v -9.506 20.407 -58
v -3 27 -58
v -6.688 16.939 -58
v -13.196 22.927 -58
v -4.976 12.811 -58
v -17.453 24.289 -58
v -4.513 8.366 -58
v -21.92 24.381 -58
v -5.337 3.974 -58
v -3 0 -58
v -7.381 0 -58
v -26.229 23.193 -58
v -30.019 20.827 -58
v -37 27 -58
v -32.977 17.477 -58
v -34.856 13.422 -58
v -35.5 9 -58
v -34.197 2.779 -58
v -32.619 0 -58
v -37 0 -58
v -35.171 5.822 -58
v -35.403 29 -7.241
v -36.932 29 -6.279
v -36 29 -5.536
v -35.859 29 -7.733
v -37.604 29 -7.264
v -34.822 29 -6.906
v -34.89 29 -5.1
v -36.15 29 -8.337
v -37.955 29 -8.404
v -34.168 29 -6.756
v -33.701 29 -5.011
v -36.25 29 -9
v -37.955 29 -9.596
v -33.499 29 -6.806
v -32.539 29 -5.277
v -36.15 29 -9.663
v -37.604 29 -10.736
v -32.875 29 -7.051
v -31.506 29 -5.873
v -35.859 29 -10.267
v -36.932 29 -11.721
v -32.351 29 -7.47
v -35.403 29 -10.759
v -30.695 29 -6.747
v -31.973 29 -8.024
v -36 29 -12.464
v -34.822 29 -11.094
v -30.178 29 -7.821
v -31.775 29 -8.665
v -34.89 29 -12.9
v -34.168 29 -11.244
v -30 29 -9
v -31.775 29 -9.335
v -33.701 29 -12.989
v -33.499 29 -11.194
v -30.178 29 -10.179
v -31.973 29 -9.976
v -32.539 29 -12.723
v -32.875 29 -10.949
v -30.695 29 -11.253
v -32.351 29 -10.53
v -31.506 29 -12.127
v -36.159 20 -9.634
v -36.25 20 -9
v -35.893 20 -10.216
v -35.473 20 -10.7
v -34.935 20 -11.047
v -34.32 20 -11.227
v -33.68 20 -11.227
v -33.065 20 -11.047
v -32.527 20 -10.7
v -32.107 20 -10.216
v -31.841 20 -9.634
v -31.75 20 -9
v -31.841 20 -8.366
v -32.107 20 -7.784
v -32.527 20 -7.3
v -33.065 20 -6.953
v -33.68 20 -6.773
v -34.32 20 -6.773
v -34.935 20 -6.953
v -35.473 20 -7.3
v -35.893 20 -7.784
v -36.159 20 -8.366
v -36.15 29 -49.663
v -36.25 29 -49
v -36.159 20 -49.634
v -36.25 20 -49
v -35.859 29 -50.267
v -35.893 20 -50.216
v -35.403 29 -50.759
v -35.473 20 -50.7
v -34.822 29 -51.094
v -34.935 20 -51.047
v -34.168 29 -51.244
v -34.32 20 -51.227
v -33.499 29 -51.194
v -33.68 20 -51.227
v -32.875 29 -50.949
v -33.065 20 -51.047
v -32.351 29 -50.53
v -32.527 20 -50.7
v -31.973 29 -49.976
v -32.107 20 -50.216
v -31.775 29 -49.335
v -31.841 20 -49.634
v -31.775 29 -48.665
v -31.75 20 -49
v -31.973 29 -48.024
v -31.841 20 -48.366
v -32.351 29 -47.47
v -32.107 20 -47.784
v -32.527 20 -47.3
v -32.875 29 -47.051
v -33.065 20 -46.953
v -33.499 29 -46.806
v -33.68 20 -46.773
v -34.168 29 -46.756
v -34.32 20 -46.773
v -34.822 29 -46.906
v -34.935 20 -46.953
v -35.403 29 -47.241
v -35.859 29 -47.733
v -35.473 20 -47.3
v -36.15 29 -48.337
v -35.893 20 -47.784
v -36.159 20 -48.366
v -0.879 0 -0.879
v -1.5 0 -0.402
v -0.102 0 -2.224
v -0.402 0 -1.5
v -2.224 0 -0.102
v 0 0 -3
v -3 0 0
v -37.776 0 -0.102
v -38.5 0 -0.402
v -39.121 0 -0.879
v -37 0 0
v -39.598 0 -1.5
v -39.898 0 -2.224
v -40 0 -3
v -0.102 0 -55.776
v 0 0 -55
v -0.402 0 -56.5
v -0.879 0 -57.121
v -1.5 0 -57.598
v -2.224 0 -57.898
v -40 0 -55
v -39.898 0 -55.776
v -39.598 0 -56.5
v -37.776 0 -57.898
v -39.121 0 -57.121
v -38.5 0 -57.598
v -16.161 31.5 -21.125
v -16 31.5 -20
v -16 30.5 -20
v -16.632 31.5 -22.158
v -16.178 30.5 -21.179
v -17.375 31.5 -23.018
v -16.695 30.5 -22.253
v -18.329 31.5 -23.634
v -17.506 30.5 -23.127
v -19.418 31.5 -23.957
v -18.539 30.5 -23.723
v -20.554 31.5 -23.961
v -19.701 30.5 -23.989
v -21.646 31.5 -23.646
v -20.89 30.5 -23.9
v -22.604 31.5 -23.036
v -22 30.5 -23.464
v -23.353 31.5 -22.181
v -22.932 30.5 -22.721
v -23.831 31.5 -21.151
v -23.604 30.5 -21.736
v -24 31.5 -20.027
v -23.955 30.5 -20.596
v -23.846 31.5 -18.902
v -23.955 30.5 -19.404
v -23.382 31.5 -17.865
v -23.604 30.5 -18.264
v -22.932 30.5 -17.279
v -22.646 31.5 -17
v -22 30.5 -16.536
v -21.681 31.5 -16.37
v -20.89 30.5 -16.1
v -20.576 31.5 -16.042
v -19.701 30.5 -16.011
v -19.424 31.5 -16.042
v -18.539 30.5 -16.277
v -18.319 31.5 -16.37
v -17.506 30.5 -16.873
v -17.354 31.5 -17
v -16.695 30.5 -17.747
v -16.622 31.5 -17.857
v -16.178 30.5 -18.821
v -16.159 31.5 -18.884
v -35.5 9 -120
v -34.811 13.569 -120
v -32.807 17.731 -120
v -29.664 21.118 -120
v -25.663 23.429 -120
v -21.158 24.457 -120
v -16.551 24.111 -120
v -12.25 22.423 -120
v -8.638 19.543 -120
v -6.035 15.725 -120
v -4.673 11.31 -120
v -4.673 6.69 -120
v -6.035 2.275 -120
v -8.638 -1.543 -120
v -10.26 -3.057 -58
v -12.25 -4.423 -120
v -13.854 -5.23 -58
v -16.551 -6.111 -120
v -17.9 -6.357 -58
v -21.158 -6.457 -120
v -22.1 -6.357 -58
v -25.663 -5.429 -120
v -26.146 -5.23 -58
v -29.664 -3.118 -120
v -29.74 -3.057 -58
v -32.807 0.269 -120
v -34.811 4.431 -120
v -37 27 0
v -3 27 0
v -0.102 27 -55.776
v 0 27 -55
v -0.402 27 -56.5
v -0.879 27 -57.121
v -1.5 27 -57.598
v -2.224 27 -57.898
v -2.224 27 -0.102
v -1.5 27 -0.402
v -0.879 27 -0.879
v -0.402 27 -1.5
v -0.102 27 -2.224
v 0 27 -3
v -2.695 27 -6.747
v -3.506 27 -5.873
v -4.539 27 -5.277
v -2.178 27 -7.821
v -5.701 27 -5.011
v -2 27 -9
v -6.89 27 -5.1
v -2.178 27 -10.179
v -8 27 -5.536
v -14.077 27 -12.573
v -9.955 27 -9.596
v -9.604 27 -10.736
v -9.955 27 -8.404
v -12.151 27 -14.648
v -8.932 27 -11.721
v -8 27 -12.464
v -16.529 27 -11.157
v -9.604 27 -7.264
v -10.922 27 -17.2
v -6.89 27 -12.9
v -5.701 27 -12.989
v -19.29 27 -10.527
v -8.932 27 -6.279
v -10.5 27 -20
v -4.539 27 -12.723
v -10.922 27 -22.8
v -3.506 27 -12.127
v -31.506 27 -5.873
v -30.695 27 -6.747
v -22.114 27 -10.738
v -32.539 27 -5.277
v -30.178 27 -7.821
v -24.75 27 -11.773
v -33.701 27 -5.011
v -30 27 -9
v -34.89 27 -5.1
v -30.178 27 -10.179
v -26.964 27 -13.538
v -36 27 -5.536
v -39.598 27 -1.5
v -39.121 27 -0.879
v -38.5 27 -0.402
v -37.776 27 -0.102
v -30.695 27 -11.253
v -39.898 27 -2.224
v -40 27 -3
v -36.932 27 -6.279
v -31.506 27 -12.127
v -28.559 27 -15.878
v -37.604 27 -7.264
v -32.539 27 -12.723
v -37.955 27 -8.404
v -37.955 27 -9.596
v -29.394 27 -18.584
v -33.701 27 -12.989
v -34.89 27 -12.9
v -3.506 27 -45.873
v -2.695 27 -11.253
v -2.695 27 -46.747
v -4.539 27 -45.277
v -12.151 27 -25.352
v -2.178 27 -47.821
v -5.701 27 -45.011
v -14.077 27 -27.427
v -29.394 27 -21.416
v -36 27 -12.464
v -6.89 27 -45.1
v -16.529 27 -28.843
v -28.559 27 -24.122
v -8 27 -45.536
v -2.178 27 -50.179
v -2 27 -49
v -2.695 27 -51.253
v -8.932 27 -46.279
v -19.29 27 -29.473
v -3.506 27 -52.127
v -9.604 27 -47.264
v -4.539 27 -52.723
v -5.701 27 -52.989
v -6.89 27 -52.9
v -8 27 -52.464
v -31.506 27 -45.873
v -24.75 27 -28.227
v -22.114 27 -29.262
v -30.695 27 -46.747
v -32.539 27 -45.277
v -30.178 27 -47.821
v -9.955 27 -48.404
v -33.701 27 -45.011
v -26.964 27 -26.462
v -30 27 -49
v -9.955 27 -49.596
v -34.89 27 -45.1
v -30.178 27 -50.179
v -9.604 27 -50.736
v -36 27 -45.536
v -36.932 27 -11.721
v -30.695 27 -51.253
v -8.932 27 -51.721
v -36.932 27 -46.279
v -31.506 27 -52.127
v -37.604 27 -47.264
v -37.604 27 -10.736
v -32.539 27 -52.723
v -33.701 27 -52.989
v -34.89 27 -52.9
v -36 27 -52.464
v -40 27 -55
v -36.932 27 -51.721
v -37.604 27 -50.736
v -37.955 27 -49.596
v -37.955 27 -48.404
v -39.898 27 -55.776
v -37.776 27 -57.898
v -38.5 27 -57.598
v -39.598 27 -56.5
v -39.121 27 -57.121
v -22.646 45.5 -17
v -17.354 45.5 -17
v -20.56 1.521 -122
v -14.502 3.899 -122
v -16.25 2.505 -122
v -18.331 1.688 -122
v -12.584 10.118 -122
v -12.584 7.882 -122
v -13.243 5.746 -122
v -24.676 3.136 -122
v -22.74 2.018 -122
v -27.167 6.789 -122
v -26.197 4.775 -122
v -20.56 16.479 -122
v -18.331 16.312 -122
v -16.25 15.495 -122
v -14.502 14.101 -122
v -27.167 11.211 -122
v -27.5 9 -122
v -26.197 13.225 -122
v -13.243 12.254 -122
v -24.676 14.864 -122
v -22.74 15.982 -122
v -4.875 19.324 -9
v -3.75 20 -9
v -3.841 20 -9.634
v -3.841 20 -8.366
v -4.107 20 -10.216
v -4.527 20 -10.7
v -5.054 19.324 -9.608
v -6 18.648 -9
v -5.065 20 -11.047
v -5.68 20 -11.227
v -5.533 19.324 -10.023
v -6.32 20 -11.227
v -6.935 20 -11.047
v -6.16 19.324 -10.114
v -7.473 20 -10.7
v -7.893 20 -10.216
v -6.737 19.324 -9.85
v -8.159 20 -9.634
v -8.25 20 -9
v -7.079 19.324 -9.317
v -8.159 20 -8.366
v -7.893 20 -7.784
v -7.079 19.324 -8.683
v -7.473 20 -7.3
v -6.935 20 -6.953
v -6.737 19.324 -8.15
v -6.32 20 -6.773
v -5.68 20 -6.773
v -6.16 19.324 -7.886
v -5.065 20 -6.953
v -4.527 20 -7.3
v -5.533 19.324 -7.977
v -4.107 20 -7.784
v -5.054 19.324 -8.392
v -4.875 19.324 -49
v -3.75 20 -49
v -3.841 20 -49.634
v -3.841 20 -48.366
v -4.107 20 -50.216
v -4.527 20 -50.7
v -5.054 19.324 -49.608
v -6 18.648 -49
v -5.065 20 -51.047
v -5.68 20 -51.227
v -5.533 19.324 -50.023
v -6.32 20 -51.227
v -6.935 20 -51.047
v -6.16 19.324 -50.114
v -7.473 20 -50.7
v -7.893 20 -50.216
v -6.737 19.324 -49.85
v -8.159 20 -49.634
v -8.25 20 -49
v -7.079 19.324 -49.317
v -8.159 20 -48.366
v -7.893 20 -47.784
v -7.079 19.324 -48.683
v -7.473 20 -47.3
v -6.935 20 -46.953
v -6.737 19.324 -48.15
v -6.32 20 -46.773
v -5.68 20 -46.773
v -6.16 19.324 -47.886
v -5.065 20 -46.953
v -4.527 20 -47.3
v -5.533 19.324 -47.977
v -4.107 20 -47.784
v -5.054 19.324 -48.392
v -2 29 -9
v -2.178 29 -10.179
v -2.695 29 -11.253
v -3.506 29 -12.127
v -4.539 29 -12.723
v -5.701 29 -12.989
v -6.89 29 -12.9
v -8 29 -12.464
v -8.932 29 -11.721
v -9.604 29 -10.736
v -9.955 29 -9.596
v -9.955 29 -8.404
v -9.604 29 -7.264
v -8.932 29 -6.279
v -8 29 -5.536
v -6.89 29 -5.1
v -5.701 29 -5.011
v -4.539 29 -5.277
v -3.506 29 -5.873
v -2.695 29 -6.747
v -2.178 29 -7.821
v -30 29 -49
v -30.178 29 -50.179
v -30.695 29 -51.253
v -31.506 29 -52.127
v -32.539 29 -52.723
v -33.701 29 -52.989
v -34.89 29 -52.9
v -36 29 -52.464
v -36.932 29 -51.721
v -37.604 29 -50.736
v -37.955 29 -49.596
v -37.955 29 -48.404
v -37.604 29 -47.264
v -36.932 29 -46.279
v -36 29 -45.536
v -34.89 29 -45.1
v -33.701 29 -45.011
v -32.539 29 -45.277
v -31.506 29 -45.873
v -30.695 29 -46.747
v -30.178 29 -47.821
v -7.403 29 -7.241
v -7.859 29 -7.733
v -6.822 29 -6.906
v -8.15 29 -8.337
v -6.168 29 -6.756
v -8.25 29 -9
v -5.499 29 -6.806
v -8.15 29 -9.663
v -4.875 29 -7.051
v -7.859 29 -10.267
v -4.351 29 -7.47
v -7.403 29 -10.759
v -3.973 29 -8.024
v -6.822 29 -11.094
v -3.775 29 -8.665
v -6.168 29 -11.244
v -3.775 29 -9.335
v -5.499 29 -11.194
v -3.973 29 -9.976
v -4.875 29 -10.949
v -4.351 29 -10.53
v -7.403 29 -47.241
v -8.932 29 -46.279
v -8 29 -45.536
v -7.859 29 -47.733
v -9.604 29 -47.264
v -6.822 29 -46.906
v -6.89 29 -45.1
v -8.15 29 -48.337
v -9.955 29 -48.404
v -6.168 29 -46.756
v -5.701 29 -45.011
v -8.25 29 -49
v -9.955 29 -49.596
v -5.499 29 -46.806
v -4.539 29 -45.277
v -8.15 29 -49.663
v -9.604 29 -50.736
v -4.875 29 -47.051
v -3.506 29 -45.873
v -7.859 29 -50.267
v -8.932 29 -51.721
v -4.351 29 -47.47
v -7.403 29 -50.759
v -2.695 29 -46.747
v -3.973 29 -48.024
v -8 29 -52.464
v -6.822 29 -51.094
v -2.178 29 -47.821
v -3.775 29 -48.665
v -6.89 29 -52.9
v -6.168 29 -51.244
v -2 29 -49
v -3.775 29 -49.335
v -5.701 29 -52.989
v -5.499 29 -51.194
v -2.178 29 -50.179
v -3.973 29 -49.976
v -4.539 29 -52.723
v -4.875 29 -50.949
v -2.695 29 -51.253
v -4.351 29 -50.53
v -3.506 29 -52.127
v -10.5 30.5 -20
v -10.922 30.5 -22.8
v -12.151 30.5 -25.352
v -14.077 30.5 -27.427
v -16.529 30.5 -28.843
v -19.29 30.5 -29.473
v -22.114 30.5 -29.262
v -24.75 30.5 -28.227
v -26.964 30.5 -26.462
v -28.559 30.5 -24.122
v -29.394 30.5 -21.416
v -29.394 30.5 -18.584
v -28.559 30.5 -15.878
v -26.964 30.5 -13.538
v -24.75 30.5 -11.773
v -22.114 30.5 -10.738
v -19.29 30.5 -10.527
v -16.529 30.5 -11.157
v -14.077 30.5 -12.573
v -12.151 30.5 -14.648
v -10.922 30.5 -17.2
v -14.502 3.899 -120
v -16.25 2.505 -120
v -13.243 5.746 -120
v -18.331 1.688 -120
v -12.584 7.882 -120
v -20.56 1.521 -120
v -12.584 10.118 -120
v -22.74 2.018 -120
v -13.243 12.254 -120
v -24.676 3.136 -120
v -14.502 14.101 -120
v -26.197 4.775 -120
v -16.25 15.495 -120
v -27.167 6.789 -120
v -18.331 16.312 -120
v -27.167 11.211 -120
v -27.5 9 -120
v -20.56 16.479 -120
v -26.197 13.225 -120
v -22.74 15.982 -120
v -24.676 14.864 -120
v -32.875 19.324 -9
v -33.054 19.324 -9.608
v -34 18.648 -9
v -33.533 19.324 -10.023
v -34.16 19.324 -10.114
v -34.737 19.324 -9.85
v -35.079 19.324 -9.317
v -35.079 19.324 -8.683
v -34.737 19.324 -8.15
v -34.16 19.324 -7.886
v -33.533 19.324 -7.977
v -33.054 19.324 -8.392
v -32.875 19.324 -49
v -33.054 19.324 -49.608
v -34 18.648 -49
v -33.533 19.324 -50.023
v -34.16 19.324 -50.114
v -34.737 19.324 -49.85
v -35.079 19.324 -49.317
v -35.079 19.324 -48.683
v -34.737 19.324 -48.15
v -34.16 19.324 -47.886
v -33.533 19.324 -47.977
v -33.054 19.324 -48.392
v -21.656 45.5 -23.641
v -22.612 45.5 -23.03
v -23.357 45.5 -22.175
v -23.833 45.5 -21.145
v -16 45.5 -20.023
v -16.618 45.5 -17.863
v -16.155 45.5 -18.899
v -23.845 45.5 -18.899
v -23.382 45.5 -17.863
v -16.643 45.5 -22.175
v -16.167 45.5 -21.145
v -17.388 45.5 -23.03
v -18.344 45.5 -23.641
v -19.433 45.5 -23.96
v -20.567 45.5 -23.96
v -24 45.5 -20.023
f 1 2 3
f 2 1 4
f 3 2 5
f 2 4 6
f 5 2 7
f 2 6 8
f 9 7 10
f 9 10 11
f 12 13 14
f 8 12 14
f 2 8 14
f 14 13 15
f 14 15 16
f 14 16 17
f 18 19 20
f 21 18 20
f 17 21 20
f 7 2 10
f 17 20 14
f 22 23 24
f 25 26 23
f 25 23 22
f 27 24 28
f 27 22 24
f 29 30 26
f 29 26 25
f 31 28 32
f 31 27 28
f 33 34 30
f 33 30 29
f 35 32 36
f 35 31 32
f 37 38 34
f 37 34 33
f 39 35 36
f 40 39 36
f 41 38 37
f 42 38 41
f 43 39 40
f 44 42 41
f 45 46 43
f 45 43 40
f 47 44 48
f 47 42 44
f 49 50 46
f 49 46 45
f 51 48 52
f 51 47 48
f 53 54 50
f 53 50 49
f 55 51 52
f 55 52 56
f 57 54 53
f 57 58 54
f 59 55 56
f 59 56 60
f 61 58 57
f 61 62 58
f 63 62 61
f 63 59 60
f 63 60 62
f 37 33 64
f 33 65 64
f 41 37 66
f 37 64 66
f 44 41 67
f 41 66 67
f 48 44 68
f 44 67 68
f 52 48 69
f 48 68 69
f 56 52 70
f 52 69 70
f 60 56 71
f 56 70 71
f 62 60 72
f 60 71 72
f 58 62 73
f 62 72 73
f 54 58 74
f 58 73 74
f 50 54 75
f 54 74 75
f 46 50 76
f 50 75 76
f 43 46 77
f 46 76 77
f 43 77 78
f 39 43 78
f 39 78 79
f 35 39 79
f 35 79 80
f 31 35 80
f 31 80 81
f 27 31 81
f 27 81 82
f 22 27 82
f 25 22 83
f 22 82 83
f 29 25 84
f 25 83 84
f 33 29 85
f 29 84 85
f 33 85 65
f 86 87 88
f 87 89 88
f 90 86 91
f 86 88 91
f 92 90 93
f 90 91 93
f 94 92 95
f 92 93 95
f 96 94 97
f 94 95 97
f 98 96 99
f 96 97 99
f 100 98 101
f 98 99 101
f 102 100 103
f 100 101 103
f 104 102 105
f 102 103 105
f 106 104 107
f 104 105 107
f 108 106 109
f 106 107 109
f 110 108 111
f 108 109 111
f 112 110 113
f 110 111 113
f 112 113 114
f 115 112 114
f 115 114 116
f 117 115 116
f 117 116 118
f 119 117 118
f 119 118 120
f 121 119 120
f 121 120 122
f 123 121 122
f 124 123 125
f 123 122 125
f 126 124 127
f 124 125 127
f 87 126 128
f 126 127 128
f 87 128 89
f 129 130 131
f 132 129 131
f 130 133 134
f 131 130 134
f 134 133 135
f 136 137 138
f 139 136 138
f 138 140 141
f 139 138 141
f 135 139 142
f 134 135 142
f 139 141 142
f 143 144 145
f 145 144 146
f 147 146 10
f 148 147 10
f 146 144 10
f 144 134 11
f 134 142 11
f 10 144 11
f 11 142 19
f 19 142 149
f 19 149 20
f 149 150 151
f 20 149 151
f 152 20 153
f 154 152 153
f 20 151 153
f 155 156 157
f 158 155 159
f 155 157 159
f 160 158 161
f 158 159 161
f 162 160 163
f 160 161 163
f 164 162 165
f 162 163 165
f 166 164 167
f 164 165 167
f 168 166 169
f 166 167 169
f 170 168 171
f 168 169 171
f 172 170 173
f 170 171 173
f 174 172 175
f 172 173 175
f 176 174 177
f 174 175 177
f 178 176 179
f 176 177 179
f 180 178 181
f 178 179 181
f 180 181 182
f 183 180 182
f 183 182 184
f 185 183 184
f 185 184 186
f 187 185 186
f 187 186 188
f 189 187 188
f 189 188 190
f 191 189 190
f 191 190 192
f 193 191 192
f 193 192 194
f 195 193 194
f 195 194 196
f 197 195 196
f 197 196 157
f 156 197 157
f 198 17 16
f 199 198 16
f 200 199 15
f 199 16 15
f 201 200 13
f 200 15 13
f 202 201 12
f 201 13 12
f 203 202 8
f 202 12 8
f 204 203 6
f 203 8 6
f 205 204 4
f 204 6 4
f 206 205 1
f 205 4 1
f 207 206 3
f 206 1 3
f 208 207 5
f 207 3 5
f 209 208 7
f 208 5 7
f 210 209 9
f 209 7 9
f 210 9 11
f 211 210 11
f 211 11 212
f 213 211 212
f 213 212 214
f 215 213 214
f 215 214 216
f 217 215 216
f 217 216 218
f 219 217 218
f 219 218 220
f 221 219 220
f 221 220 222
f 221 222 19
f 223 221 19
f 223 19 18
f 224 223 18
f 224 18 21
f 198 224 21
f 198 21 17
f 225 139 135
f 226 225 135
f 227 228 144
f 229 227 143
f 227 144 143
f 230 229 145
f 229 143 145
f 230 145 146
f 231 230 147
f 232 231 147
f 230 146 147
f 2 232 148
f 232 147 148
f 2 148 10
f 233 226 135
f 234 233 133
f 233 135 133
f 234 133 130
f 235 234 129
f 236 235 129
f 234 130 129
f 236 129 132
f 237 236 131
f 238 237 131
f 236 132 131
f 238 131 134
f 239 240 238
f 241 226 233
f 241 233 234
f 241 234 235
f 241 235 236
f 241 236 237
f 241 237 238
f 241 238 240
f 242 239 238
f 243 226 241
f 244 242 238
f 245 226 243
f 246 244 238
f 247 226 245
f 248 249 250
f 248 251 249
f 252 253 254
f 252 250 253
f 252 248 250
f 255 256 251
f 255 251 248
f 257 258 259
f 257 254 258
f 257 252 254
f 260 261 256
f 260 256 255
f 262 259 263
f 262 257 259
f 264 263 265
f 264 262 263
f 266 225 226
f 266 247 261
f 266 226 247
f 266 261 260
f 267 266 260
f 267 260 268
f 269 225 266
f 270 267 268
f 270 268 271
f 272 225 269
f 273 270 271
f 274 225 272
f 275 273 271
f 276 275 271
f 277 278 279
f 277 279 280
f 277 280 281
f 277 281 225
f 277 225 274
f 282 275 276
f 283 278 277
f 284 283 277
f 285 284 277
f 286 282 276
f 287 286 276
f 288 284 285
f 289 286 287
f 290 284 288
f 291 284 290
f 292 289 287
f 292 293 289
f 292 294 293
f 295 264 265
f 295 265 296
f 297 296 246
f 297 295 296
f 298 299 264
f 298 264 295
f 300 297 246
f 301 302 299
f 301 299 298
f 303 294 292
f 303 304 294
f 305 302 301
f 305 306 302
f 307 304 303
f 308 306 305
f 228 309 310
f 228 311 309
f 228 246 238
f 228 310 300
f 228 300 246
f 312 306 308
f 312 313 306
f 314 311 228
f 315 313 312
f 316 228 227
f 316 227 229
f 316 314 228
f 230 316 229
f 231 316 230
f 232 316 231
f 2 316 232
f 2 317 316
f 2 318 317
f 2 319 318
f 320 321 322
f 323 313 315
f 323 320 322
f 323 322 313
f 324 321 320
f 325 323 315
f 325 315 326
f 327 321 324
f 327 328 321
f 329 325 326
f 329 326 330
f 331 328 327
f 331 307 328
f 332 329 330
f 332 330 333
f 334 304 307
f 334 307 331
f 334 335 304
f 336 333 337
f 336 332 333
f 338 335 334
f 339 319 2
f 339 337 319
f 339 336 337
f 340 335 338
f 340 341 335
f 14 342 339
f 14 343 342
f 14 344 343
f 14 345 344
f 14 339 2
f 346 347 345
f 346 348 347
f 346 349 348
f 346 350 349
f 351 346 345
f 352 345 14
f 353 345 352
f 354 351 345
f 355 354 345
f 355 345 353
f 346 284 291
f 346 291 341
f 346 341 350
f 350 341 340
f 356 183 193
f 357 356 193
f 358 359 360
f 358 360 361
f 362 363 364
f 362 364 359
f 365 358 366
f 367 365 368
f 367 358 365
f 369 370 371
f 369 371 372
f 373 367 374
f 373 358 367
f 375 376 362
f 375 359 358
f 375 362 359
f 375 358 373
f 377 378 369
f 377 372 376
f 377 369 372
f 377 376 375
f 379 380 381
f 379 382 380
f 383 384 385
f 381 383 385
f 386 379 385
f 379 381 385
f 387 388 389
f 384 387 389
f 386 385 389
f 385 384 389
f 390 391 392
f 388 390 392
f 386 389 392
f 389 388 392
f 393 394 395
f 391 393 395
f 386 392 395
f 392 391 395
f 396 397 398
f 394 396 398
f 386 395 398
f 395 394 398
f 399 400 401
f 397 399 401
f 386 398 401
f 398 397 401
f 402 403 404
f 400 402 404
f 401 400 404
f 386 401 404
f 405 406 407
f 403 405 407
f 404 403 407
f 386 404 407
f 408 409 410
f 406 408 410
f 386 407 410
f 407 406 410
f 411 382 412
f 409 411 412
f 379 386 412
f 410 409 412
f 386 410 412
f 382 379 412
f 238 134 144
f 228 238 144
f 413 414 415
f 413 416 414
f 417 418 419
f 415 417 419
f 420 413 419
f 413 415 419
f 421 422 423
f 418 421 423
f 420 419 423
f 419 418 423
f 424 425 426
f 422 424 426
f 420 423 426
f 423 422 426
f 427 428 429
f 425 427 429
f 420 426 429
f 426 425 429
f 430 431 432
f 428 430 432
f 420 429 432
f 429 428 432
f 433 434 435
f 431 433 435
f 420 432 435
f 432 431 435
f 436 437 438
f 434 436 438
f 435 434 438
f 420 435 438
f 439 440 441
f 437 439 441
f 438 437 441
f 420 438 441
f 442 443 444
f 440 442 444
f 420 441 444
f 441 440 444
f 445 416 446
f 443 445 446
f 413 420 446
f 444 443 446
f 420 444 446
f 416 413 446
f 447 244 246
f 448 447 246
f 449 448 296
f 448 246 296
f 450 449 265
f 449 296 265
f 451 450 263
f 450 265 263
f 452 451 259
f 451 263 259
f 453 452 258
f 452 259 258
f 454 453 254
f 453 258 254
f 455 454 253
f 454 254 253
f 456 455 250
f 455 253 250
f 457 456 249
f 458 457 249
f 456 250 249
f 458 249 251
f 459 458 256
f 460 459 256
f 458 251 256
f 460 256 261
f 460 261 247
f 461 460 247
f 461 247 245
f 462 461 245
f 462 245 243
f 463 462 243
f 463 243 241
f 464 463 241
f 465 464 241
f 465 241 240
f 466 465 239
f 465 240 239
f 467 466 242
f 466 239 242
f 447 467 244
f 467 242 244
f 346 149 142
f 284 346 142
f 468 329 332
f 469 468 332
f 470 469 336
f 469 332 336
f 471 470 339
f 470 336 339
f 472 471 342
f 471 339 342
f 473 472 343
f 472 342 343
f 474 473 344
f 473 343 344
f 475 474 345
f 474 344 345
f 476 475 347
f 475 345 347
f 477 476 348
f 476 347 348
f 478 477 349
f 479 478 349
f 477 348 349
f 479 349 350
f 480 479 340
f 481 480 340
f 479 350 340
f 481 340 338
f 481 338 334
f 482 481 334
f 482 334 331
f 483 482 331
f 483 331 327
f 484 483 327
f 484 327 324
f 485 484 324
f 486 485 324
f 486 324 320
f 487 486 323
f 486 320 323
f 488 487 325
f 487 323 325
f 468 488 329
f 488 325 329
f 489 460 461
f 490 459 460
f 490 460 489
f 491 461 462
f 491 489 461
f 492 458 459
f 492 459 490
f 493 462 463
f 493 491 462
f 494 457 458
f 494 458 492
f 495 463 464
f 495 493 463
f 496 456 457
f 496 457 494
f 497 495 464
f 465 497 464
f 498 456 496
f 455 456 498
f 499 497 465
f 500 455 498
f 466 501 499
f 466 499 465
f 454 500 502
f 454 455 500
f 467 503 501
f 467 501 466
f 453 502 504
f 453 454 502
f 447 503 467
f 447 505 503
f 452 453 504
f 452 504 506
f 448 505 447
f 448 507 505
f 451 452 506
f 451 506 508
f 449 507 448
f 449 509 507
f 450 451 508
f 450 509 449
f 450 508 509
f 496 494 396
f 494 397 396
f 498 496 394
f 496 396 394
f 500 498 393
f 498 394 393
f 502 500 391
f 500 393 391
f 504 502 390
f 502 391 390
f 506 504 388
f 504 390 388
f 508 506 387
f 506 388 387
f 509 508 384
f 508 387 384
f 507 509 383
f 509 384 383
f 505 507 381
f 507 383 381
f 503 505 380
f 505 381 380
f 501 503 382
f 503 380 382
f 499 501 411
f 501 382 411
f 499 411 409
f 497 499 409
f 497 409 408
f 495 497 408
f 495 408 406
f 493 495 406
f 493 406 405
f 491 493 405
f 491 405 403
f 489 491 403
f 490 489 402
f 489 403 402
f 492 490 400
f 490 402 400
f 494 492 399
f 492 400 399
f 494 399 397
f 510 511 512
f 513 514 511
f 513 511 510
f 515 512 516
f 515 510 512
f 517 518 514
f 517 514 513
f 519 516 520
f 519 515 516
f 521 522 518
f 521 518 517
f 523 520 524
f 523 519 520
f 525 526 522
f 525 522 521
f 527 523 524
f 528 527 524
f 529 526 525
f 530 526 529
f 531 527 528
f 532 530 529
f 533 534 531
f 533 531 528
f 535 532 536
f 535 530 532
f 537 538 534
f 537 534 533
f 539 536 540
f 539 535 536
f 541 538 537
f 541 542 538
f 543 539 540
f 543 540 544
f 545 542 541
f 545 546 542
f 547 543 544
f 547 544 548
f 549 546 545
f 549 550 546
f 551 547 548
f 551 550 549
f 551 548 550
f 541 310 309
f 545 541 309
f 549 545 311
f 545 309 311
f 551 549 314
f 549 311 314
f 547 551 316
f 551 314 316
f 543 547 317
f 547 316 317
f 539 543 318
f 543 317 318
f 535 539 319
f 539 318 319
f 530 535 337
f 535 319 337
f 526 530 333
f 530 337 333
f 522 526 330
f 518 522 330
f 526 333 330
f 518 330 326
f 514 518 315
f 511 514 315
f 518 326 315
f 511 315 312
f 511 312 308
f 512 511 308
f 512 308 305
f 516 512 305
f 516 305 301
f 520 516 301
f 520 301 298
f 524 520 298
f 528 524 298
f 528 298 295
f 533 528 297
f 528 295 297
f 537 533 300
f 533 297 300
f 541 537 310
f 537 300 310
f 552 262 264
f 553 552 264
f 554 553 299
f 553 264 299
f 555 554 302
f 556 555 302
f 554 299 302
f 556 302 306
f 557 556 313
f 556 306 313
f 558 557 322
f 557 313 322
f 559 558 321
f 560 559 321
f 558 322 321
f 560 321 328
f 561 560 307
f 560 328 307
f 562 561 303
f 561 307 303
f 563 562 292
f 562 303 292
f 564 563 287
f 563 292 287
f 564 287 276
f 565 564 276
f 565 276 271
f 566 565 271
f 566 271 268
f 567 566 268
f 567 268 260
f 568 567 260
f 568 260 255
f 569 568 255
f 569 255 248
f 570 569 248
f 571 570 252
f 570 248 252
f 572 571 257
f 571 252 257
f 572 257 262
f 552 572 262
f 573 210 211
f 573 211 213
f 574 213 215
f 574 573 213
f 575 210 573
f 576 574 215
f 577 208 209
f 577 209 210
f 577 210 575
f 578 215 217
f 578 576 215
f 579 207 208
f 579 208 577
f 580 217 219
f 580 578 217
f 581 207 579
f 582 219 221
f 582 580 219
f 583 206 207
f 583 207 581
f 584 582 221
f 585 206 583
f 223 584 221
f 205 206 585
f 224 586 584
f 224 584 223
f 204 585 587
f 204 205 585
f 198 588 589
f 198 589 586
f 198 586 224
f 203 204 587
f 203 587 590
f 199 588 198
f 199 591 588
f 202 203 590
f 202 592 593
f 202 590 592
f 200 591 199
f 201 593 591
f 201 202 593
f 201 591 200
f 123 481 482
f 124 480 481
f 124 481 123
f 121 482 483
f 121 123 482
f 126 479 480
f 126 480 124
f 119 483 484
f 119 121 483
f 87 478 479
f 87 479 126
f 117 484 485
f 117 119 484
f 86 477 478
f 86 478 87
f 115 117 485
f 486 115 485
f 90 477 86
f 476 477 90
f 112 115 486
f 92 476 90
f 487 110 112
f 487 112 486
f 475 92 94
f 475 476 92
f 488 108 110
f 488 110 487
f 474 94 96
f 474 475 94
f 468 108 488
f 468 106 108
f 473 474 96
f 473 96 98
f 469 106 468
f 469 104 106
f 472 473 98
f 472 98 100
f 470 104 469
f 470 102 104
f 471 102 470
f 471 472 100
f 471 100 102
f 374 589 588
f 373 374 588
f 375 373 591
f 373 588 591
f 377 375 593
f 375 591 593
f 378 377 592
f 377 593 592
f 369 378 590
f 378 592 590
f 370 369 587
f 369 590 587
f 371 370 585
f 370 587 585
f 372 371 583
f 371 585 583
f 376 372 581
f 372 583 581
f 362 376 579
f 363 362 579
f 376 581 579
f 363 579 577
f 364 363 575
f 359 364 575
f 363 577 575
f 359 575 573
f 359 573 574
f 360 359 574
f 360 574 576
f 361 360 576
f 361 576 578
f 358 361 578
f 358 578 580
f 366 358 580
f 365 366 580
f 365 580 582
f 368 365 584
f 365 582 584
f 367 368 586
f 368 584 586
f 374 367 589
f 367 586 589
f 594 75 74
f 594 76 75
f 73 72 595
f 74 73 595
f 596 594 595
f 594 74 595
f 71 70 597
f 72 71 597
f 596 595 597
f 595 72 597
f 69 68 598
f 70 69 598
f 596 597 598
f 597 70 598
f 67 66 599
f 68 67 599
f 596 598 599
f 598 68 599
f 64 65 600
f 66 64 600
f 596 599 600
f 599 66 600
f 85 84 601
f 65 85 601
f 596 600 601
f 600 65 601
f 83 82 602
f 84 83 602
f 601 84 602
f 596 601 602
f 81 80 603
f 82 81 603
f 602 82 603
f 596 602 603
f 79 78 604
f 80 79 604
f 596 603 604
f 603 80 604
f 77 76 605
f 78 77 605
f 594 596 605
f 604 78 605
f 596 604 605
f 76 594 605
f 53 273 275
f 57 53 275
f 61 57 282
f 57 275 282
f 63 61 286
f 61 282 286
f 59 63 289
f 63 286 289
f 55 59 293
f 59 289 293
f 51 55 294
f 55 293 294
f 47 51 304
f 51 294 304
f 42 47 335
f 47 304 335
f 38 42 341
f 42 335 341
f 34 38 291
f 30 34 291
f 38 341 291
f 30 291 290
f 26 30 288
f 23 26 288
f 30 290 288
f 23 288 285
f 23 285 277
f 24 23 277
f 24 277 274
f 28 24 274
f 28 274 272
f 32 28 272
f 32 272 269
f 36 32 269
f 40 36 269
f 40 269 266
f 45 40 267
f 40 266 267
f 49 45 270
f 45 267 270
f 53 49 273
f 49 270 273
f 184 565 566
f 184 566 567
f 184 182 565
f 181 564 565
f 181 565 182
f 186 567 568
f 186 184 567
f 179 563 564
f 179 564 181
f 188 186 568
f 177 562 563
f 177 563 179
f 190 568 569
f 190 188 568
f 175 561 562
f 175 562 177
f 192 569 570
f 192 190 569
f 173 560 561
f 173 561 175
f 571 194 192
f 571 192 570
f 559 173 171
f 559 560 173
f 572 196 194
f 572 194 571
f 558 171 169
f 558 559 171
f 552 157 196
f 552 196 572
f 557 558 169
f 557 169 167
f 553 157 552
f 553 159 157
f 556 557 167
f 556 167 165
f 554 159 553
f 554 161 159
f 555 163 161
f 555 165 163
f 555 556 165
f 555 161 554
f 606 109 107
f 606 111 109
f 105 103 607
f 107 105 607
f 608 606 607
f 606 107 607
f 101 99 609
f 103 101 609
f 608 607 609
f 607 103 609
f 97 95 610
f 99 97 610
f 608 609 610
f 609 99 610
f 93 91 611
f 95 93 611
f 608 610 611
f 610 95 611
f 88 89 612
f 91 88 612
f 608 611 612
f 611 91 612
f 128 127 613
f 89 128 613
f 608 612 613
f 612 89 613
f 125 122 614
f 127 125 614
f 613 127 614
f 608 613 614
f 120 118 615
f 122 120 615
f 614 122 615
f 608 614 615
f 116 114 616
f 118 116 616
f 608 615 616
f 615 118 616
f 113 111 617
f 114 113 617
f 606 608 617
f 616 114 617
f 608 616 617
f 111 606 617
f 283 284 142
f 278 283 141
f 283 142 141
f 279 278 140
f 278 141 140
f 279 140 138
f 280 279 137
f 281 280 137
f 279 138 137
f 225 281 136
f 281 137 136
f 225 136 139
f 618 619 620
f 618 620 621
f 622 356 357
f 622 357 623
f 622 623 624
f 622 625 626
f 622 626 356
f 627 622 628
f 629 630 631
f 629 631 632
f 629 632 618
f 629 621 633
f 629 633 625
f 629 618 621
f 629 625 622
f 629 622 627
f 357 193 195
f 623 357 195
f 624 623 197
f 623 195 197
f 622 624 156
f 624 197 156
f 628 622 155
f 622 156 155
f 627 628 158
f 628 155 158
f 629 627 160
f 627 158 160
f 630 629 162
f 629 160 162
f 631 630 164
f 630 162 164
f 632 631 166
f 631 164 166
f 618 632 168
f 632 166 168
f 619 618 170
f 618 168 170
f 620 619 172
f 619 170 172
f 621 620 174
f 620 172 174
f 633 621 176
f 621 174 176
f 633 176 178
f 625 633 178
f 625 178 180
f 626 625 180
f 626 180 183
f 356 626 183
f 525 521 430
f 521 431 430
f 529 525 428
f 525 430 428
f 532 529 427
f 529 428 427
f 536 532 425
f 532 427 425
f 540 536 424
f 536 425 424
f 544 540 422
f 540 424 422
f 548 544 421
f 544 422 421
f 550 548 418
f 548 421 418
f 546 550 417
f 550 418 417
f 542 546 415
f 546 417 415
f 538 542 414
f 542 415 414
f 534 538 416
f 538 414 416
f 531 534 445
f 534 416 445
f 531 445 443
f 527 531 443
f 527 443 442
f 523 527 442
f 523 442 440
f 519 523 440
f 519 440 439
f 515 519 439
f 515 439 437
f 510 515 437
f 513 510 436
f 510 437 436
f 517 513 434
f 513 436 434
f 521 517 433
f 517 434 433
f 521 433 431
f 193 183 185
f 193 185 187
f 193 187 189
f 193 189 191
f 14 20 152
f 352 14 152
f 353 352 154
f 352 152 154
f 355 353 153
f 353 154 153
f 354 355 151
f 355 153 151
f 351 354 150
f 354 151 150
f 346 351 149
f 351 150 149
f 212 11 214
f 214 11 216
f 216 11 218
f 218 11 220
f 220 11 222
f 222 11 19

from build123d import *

# Parameters (mm, degrees)
BOSS_EXTRUDE2_DEPTH      = 27
SKETCH2_R                = 4
BOSS_EXTRUDE3_DEPTH      = 2
SKETCH3_R                = 9.5
BOSS_EXTRUDE4_DEPTH      = 3.5
SKETCH4_R                = 4
BOSS_EXTRUDE5_DEPTH      = 1
BOSS_EXTRUDE6_DEPTH      = 14
M4_CLEARANCE_HOLE1_D     = 4.5
M4_CLEARANCE_HOLE1_DEPTH = 9
M4_CLEARANCE_HOLE1_TIP   = 1.351936393
SKETCH8_R                = 15.5
BOSS_EXTRUDE7_DEPTH      = 62
SKETCH9_R                = 7.5
BOSS_EXTRUDE8_DEPTH      = 2


with BuildPart() as part:
    # Sketch1 → Boss-Extrude2 (new body)
    with BuildSketch(Plane(origin=(0, 0, 0), x_dir=(0, 0, -1), z_dir=(0, 1, 0))):
        with BuildLine():
            Line((3, 0), (55, 0))
            ThreePointArc((55, 0), (57.121320344, 0.878679656), (58, 3))
            Line((58, 3), (58, 37))
            ThreePointArc((58, 37), (57.121320344, 39.121320344), (55, 40))
            Line((55, 40), (3, 40))
            ThreePointArc((3, 40), (0.878679656, 39.121320344), (0, 37))
            Line((0, 37), (0, 3))
            ThreePointArc((0, 3), (0.878679656, 0.878679656), (3, 0))
        make_face()
    extrude(amount=BOSS_EXTRUDE2_DEPTH)

    # Sketch2 → Boss-Extrude3 (add)
    with BuildSketch(Plane(origin=(0, 27, 0), x_dir=(1, 0, 0), z_dir=(0, 1, 0))):
        with Locations((-34, 9)):
            Circle(SKETCH2_R)
        with Locations((-6, 9)):
            Circle(SKETCH2_R)
        with Locations((-6, 49)):
            Circle(SKETCH2_R)
        with Locations((-34, 49)):
            Circle(SKETCH2_R)
    extrude(amount=BOSS_EXTRUDE3_DEPTH)

    # Sketch3 → Boss-Extrude4 (add)
    with BuildSketch(Plane(origin=(0, 27, 0), x_dir=(1, 0, 0), z_dir=(0, 1, 0))):
        with Locations((-20, 20)):
            Circle(SKETCH3_R)
    extrude(amount=BOSS_EXTRUDE4_DEPTH)

    # Sketch4 → Boss-Extrude5 (add)
    with BuildSketch(Plane(origin=(0, 30.5, 0), x_dir=(1, 0, 0), z_dir=(0, 1, 0))):
        with Locations((-20, 20)):
            Circle(SKETCH4_R)
    extrude(amount=BOSS_EXTRUDE5_DEPTH)

    # Sketch5 → Boss-Extrude6 (add)
    with BuildSketch(Plane(origin=(0, 31.5, 0), x_dir=(1, 0, 0), z_dir=(0, 1, 0))):
        with BuildLine():
            Line((-22.645751311, 17), (-17.354248689, 17))
            ThreePointArc((-17.354248689, 17), (-20, 24), (-22.645751311, 17))
        make_face()
    extrude(amount=BOSS_EXTRUDE6_DEPTH)

    # M4 Clearance Hole1
    with Locations(Plane(origin=(0, 29, 0), x_dir=(1, 0, 0), z_dir=(0, 1, 0))):
        with Locations((-34, 9), (-34, 49), (-6, 49), (-6, 9)):
            Hole(M4_CLEARANCE_HOLE1_D / 2, depth=M4_CLEARANCE_HOLE1_DEPTH)
            with Locations((0, 0, -(M4_CLEARANCE_HOLE1_DEPTH + M4_CLEARANCE_HOLE1_TIP / 2))):  # 118° drill point
                Cone(0, M4_CLEARANCE_HOLE1_D / 2, M4_CLEARANCE_HOLE1_TIP, mode=Mode.SUBTRACT)

    # Sketch8 → Boss-Extrude7 (add)
    with BuildSketch(Plane(origin=(0, 0, -58), x_dir=(-1, 0, 0), z_dir=(0, 0, -1))):
        with Locations((20, 9)):
            Circle(SKETCH8_R)
    extrude(amount=BOSS_EXTRUDE7_DEPTH)

    # Sketch9 → Boss-Extrude8 (add)
    with BuildSketch(Plane(origin=(0, 0, -120), x_dir=(-1, 0, 0), z_dir=(0, 0, -1))):
        with Locations((20, 9)):
            Circle(SKETCH9_R)
    extrude(amount=BOSS_EXTRUDE8_DEPTH)


solid = part.part
